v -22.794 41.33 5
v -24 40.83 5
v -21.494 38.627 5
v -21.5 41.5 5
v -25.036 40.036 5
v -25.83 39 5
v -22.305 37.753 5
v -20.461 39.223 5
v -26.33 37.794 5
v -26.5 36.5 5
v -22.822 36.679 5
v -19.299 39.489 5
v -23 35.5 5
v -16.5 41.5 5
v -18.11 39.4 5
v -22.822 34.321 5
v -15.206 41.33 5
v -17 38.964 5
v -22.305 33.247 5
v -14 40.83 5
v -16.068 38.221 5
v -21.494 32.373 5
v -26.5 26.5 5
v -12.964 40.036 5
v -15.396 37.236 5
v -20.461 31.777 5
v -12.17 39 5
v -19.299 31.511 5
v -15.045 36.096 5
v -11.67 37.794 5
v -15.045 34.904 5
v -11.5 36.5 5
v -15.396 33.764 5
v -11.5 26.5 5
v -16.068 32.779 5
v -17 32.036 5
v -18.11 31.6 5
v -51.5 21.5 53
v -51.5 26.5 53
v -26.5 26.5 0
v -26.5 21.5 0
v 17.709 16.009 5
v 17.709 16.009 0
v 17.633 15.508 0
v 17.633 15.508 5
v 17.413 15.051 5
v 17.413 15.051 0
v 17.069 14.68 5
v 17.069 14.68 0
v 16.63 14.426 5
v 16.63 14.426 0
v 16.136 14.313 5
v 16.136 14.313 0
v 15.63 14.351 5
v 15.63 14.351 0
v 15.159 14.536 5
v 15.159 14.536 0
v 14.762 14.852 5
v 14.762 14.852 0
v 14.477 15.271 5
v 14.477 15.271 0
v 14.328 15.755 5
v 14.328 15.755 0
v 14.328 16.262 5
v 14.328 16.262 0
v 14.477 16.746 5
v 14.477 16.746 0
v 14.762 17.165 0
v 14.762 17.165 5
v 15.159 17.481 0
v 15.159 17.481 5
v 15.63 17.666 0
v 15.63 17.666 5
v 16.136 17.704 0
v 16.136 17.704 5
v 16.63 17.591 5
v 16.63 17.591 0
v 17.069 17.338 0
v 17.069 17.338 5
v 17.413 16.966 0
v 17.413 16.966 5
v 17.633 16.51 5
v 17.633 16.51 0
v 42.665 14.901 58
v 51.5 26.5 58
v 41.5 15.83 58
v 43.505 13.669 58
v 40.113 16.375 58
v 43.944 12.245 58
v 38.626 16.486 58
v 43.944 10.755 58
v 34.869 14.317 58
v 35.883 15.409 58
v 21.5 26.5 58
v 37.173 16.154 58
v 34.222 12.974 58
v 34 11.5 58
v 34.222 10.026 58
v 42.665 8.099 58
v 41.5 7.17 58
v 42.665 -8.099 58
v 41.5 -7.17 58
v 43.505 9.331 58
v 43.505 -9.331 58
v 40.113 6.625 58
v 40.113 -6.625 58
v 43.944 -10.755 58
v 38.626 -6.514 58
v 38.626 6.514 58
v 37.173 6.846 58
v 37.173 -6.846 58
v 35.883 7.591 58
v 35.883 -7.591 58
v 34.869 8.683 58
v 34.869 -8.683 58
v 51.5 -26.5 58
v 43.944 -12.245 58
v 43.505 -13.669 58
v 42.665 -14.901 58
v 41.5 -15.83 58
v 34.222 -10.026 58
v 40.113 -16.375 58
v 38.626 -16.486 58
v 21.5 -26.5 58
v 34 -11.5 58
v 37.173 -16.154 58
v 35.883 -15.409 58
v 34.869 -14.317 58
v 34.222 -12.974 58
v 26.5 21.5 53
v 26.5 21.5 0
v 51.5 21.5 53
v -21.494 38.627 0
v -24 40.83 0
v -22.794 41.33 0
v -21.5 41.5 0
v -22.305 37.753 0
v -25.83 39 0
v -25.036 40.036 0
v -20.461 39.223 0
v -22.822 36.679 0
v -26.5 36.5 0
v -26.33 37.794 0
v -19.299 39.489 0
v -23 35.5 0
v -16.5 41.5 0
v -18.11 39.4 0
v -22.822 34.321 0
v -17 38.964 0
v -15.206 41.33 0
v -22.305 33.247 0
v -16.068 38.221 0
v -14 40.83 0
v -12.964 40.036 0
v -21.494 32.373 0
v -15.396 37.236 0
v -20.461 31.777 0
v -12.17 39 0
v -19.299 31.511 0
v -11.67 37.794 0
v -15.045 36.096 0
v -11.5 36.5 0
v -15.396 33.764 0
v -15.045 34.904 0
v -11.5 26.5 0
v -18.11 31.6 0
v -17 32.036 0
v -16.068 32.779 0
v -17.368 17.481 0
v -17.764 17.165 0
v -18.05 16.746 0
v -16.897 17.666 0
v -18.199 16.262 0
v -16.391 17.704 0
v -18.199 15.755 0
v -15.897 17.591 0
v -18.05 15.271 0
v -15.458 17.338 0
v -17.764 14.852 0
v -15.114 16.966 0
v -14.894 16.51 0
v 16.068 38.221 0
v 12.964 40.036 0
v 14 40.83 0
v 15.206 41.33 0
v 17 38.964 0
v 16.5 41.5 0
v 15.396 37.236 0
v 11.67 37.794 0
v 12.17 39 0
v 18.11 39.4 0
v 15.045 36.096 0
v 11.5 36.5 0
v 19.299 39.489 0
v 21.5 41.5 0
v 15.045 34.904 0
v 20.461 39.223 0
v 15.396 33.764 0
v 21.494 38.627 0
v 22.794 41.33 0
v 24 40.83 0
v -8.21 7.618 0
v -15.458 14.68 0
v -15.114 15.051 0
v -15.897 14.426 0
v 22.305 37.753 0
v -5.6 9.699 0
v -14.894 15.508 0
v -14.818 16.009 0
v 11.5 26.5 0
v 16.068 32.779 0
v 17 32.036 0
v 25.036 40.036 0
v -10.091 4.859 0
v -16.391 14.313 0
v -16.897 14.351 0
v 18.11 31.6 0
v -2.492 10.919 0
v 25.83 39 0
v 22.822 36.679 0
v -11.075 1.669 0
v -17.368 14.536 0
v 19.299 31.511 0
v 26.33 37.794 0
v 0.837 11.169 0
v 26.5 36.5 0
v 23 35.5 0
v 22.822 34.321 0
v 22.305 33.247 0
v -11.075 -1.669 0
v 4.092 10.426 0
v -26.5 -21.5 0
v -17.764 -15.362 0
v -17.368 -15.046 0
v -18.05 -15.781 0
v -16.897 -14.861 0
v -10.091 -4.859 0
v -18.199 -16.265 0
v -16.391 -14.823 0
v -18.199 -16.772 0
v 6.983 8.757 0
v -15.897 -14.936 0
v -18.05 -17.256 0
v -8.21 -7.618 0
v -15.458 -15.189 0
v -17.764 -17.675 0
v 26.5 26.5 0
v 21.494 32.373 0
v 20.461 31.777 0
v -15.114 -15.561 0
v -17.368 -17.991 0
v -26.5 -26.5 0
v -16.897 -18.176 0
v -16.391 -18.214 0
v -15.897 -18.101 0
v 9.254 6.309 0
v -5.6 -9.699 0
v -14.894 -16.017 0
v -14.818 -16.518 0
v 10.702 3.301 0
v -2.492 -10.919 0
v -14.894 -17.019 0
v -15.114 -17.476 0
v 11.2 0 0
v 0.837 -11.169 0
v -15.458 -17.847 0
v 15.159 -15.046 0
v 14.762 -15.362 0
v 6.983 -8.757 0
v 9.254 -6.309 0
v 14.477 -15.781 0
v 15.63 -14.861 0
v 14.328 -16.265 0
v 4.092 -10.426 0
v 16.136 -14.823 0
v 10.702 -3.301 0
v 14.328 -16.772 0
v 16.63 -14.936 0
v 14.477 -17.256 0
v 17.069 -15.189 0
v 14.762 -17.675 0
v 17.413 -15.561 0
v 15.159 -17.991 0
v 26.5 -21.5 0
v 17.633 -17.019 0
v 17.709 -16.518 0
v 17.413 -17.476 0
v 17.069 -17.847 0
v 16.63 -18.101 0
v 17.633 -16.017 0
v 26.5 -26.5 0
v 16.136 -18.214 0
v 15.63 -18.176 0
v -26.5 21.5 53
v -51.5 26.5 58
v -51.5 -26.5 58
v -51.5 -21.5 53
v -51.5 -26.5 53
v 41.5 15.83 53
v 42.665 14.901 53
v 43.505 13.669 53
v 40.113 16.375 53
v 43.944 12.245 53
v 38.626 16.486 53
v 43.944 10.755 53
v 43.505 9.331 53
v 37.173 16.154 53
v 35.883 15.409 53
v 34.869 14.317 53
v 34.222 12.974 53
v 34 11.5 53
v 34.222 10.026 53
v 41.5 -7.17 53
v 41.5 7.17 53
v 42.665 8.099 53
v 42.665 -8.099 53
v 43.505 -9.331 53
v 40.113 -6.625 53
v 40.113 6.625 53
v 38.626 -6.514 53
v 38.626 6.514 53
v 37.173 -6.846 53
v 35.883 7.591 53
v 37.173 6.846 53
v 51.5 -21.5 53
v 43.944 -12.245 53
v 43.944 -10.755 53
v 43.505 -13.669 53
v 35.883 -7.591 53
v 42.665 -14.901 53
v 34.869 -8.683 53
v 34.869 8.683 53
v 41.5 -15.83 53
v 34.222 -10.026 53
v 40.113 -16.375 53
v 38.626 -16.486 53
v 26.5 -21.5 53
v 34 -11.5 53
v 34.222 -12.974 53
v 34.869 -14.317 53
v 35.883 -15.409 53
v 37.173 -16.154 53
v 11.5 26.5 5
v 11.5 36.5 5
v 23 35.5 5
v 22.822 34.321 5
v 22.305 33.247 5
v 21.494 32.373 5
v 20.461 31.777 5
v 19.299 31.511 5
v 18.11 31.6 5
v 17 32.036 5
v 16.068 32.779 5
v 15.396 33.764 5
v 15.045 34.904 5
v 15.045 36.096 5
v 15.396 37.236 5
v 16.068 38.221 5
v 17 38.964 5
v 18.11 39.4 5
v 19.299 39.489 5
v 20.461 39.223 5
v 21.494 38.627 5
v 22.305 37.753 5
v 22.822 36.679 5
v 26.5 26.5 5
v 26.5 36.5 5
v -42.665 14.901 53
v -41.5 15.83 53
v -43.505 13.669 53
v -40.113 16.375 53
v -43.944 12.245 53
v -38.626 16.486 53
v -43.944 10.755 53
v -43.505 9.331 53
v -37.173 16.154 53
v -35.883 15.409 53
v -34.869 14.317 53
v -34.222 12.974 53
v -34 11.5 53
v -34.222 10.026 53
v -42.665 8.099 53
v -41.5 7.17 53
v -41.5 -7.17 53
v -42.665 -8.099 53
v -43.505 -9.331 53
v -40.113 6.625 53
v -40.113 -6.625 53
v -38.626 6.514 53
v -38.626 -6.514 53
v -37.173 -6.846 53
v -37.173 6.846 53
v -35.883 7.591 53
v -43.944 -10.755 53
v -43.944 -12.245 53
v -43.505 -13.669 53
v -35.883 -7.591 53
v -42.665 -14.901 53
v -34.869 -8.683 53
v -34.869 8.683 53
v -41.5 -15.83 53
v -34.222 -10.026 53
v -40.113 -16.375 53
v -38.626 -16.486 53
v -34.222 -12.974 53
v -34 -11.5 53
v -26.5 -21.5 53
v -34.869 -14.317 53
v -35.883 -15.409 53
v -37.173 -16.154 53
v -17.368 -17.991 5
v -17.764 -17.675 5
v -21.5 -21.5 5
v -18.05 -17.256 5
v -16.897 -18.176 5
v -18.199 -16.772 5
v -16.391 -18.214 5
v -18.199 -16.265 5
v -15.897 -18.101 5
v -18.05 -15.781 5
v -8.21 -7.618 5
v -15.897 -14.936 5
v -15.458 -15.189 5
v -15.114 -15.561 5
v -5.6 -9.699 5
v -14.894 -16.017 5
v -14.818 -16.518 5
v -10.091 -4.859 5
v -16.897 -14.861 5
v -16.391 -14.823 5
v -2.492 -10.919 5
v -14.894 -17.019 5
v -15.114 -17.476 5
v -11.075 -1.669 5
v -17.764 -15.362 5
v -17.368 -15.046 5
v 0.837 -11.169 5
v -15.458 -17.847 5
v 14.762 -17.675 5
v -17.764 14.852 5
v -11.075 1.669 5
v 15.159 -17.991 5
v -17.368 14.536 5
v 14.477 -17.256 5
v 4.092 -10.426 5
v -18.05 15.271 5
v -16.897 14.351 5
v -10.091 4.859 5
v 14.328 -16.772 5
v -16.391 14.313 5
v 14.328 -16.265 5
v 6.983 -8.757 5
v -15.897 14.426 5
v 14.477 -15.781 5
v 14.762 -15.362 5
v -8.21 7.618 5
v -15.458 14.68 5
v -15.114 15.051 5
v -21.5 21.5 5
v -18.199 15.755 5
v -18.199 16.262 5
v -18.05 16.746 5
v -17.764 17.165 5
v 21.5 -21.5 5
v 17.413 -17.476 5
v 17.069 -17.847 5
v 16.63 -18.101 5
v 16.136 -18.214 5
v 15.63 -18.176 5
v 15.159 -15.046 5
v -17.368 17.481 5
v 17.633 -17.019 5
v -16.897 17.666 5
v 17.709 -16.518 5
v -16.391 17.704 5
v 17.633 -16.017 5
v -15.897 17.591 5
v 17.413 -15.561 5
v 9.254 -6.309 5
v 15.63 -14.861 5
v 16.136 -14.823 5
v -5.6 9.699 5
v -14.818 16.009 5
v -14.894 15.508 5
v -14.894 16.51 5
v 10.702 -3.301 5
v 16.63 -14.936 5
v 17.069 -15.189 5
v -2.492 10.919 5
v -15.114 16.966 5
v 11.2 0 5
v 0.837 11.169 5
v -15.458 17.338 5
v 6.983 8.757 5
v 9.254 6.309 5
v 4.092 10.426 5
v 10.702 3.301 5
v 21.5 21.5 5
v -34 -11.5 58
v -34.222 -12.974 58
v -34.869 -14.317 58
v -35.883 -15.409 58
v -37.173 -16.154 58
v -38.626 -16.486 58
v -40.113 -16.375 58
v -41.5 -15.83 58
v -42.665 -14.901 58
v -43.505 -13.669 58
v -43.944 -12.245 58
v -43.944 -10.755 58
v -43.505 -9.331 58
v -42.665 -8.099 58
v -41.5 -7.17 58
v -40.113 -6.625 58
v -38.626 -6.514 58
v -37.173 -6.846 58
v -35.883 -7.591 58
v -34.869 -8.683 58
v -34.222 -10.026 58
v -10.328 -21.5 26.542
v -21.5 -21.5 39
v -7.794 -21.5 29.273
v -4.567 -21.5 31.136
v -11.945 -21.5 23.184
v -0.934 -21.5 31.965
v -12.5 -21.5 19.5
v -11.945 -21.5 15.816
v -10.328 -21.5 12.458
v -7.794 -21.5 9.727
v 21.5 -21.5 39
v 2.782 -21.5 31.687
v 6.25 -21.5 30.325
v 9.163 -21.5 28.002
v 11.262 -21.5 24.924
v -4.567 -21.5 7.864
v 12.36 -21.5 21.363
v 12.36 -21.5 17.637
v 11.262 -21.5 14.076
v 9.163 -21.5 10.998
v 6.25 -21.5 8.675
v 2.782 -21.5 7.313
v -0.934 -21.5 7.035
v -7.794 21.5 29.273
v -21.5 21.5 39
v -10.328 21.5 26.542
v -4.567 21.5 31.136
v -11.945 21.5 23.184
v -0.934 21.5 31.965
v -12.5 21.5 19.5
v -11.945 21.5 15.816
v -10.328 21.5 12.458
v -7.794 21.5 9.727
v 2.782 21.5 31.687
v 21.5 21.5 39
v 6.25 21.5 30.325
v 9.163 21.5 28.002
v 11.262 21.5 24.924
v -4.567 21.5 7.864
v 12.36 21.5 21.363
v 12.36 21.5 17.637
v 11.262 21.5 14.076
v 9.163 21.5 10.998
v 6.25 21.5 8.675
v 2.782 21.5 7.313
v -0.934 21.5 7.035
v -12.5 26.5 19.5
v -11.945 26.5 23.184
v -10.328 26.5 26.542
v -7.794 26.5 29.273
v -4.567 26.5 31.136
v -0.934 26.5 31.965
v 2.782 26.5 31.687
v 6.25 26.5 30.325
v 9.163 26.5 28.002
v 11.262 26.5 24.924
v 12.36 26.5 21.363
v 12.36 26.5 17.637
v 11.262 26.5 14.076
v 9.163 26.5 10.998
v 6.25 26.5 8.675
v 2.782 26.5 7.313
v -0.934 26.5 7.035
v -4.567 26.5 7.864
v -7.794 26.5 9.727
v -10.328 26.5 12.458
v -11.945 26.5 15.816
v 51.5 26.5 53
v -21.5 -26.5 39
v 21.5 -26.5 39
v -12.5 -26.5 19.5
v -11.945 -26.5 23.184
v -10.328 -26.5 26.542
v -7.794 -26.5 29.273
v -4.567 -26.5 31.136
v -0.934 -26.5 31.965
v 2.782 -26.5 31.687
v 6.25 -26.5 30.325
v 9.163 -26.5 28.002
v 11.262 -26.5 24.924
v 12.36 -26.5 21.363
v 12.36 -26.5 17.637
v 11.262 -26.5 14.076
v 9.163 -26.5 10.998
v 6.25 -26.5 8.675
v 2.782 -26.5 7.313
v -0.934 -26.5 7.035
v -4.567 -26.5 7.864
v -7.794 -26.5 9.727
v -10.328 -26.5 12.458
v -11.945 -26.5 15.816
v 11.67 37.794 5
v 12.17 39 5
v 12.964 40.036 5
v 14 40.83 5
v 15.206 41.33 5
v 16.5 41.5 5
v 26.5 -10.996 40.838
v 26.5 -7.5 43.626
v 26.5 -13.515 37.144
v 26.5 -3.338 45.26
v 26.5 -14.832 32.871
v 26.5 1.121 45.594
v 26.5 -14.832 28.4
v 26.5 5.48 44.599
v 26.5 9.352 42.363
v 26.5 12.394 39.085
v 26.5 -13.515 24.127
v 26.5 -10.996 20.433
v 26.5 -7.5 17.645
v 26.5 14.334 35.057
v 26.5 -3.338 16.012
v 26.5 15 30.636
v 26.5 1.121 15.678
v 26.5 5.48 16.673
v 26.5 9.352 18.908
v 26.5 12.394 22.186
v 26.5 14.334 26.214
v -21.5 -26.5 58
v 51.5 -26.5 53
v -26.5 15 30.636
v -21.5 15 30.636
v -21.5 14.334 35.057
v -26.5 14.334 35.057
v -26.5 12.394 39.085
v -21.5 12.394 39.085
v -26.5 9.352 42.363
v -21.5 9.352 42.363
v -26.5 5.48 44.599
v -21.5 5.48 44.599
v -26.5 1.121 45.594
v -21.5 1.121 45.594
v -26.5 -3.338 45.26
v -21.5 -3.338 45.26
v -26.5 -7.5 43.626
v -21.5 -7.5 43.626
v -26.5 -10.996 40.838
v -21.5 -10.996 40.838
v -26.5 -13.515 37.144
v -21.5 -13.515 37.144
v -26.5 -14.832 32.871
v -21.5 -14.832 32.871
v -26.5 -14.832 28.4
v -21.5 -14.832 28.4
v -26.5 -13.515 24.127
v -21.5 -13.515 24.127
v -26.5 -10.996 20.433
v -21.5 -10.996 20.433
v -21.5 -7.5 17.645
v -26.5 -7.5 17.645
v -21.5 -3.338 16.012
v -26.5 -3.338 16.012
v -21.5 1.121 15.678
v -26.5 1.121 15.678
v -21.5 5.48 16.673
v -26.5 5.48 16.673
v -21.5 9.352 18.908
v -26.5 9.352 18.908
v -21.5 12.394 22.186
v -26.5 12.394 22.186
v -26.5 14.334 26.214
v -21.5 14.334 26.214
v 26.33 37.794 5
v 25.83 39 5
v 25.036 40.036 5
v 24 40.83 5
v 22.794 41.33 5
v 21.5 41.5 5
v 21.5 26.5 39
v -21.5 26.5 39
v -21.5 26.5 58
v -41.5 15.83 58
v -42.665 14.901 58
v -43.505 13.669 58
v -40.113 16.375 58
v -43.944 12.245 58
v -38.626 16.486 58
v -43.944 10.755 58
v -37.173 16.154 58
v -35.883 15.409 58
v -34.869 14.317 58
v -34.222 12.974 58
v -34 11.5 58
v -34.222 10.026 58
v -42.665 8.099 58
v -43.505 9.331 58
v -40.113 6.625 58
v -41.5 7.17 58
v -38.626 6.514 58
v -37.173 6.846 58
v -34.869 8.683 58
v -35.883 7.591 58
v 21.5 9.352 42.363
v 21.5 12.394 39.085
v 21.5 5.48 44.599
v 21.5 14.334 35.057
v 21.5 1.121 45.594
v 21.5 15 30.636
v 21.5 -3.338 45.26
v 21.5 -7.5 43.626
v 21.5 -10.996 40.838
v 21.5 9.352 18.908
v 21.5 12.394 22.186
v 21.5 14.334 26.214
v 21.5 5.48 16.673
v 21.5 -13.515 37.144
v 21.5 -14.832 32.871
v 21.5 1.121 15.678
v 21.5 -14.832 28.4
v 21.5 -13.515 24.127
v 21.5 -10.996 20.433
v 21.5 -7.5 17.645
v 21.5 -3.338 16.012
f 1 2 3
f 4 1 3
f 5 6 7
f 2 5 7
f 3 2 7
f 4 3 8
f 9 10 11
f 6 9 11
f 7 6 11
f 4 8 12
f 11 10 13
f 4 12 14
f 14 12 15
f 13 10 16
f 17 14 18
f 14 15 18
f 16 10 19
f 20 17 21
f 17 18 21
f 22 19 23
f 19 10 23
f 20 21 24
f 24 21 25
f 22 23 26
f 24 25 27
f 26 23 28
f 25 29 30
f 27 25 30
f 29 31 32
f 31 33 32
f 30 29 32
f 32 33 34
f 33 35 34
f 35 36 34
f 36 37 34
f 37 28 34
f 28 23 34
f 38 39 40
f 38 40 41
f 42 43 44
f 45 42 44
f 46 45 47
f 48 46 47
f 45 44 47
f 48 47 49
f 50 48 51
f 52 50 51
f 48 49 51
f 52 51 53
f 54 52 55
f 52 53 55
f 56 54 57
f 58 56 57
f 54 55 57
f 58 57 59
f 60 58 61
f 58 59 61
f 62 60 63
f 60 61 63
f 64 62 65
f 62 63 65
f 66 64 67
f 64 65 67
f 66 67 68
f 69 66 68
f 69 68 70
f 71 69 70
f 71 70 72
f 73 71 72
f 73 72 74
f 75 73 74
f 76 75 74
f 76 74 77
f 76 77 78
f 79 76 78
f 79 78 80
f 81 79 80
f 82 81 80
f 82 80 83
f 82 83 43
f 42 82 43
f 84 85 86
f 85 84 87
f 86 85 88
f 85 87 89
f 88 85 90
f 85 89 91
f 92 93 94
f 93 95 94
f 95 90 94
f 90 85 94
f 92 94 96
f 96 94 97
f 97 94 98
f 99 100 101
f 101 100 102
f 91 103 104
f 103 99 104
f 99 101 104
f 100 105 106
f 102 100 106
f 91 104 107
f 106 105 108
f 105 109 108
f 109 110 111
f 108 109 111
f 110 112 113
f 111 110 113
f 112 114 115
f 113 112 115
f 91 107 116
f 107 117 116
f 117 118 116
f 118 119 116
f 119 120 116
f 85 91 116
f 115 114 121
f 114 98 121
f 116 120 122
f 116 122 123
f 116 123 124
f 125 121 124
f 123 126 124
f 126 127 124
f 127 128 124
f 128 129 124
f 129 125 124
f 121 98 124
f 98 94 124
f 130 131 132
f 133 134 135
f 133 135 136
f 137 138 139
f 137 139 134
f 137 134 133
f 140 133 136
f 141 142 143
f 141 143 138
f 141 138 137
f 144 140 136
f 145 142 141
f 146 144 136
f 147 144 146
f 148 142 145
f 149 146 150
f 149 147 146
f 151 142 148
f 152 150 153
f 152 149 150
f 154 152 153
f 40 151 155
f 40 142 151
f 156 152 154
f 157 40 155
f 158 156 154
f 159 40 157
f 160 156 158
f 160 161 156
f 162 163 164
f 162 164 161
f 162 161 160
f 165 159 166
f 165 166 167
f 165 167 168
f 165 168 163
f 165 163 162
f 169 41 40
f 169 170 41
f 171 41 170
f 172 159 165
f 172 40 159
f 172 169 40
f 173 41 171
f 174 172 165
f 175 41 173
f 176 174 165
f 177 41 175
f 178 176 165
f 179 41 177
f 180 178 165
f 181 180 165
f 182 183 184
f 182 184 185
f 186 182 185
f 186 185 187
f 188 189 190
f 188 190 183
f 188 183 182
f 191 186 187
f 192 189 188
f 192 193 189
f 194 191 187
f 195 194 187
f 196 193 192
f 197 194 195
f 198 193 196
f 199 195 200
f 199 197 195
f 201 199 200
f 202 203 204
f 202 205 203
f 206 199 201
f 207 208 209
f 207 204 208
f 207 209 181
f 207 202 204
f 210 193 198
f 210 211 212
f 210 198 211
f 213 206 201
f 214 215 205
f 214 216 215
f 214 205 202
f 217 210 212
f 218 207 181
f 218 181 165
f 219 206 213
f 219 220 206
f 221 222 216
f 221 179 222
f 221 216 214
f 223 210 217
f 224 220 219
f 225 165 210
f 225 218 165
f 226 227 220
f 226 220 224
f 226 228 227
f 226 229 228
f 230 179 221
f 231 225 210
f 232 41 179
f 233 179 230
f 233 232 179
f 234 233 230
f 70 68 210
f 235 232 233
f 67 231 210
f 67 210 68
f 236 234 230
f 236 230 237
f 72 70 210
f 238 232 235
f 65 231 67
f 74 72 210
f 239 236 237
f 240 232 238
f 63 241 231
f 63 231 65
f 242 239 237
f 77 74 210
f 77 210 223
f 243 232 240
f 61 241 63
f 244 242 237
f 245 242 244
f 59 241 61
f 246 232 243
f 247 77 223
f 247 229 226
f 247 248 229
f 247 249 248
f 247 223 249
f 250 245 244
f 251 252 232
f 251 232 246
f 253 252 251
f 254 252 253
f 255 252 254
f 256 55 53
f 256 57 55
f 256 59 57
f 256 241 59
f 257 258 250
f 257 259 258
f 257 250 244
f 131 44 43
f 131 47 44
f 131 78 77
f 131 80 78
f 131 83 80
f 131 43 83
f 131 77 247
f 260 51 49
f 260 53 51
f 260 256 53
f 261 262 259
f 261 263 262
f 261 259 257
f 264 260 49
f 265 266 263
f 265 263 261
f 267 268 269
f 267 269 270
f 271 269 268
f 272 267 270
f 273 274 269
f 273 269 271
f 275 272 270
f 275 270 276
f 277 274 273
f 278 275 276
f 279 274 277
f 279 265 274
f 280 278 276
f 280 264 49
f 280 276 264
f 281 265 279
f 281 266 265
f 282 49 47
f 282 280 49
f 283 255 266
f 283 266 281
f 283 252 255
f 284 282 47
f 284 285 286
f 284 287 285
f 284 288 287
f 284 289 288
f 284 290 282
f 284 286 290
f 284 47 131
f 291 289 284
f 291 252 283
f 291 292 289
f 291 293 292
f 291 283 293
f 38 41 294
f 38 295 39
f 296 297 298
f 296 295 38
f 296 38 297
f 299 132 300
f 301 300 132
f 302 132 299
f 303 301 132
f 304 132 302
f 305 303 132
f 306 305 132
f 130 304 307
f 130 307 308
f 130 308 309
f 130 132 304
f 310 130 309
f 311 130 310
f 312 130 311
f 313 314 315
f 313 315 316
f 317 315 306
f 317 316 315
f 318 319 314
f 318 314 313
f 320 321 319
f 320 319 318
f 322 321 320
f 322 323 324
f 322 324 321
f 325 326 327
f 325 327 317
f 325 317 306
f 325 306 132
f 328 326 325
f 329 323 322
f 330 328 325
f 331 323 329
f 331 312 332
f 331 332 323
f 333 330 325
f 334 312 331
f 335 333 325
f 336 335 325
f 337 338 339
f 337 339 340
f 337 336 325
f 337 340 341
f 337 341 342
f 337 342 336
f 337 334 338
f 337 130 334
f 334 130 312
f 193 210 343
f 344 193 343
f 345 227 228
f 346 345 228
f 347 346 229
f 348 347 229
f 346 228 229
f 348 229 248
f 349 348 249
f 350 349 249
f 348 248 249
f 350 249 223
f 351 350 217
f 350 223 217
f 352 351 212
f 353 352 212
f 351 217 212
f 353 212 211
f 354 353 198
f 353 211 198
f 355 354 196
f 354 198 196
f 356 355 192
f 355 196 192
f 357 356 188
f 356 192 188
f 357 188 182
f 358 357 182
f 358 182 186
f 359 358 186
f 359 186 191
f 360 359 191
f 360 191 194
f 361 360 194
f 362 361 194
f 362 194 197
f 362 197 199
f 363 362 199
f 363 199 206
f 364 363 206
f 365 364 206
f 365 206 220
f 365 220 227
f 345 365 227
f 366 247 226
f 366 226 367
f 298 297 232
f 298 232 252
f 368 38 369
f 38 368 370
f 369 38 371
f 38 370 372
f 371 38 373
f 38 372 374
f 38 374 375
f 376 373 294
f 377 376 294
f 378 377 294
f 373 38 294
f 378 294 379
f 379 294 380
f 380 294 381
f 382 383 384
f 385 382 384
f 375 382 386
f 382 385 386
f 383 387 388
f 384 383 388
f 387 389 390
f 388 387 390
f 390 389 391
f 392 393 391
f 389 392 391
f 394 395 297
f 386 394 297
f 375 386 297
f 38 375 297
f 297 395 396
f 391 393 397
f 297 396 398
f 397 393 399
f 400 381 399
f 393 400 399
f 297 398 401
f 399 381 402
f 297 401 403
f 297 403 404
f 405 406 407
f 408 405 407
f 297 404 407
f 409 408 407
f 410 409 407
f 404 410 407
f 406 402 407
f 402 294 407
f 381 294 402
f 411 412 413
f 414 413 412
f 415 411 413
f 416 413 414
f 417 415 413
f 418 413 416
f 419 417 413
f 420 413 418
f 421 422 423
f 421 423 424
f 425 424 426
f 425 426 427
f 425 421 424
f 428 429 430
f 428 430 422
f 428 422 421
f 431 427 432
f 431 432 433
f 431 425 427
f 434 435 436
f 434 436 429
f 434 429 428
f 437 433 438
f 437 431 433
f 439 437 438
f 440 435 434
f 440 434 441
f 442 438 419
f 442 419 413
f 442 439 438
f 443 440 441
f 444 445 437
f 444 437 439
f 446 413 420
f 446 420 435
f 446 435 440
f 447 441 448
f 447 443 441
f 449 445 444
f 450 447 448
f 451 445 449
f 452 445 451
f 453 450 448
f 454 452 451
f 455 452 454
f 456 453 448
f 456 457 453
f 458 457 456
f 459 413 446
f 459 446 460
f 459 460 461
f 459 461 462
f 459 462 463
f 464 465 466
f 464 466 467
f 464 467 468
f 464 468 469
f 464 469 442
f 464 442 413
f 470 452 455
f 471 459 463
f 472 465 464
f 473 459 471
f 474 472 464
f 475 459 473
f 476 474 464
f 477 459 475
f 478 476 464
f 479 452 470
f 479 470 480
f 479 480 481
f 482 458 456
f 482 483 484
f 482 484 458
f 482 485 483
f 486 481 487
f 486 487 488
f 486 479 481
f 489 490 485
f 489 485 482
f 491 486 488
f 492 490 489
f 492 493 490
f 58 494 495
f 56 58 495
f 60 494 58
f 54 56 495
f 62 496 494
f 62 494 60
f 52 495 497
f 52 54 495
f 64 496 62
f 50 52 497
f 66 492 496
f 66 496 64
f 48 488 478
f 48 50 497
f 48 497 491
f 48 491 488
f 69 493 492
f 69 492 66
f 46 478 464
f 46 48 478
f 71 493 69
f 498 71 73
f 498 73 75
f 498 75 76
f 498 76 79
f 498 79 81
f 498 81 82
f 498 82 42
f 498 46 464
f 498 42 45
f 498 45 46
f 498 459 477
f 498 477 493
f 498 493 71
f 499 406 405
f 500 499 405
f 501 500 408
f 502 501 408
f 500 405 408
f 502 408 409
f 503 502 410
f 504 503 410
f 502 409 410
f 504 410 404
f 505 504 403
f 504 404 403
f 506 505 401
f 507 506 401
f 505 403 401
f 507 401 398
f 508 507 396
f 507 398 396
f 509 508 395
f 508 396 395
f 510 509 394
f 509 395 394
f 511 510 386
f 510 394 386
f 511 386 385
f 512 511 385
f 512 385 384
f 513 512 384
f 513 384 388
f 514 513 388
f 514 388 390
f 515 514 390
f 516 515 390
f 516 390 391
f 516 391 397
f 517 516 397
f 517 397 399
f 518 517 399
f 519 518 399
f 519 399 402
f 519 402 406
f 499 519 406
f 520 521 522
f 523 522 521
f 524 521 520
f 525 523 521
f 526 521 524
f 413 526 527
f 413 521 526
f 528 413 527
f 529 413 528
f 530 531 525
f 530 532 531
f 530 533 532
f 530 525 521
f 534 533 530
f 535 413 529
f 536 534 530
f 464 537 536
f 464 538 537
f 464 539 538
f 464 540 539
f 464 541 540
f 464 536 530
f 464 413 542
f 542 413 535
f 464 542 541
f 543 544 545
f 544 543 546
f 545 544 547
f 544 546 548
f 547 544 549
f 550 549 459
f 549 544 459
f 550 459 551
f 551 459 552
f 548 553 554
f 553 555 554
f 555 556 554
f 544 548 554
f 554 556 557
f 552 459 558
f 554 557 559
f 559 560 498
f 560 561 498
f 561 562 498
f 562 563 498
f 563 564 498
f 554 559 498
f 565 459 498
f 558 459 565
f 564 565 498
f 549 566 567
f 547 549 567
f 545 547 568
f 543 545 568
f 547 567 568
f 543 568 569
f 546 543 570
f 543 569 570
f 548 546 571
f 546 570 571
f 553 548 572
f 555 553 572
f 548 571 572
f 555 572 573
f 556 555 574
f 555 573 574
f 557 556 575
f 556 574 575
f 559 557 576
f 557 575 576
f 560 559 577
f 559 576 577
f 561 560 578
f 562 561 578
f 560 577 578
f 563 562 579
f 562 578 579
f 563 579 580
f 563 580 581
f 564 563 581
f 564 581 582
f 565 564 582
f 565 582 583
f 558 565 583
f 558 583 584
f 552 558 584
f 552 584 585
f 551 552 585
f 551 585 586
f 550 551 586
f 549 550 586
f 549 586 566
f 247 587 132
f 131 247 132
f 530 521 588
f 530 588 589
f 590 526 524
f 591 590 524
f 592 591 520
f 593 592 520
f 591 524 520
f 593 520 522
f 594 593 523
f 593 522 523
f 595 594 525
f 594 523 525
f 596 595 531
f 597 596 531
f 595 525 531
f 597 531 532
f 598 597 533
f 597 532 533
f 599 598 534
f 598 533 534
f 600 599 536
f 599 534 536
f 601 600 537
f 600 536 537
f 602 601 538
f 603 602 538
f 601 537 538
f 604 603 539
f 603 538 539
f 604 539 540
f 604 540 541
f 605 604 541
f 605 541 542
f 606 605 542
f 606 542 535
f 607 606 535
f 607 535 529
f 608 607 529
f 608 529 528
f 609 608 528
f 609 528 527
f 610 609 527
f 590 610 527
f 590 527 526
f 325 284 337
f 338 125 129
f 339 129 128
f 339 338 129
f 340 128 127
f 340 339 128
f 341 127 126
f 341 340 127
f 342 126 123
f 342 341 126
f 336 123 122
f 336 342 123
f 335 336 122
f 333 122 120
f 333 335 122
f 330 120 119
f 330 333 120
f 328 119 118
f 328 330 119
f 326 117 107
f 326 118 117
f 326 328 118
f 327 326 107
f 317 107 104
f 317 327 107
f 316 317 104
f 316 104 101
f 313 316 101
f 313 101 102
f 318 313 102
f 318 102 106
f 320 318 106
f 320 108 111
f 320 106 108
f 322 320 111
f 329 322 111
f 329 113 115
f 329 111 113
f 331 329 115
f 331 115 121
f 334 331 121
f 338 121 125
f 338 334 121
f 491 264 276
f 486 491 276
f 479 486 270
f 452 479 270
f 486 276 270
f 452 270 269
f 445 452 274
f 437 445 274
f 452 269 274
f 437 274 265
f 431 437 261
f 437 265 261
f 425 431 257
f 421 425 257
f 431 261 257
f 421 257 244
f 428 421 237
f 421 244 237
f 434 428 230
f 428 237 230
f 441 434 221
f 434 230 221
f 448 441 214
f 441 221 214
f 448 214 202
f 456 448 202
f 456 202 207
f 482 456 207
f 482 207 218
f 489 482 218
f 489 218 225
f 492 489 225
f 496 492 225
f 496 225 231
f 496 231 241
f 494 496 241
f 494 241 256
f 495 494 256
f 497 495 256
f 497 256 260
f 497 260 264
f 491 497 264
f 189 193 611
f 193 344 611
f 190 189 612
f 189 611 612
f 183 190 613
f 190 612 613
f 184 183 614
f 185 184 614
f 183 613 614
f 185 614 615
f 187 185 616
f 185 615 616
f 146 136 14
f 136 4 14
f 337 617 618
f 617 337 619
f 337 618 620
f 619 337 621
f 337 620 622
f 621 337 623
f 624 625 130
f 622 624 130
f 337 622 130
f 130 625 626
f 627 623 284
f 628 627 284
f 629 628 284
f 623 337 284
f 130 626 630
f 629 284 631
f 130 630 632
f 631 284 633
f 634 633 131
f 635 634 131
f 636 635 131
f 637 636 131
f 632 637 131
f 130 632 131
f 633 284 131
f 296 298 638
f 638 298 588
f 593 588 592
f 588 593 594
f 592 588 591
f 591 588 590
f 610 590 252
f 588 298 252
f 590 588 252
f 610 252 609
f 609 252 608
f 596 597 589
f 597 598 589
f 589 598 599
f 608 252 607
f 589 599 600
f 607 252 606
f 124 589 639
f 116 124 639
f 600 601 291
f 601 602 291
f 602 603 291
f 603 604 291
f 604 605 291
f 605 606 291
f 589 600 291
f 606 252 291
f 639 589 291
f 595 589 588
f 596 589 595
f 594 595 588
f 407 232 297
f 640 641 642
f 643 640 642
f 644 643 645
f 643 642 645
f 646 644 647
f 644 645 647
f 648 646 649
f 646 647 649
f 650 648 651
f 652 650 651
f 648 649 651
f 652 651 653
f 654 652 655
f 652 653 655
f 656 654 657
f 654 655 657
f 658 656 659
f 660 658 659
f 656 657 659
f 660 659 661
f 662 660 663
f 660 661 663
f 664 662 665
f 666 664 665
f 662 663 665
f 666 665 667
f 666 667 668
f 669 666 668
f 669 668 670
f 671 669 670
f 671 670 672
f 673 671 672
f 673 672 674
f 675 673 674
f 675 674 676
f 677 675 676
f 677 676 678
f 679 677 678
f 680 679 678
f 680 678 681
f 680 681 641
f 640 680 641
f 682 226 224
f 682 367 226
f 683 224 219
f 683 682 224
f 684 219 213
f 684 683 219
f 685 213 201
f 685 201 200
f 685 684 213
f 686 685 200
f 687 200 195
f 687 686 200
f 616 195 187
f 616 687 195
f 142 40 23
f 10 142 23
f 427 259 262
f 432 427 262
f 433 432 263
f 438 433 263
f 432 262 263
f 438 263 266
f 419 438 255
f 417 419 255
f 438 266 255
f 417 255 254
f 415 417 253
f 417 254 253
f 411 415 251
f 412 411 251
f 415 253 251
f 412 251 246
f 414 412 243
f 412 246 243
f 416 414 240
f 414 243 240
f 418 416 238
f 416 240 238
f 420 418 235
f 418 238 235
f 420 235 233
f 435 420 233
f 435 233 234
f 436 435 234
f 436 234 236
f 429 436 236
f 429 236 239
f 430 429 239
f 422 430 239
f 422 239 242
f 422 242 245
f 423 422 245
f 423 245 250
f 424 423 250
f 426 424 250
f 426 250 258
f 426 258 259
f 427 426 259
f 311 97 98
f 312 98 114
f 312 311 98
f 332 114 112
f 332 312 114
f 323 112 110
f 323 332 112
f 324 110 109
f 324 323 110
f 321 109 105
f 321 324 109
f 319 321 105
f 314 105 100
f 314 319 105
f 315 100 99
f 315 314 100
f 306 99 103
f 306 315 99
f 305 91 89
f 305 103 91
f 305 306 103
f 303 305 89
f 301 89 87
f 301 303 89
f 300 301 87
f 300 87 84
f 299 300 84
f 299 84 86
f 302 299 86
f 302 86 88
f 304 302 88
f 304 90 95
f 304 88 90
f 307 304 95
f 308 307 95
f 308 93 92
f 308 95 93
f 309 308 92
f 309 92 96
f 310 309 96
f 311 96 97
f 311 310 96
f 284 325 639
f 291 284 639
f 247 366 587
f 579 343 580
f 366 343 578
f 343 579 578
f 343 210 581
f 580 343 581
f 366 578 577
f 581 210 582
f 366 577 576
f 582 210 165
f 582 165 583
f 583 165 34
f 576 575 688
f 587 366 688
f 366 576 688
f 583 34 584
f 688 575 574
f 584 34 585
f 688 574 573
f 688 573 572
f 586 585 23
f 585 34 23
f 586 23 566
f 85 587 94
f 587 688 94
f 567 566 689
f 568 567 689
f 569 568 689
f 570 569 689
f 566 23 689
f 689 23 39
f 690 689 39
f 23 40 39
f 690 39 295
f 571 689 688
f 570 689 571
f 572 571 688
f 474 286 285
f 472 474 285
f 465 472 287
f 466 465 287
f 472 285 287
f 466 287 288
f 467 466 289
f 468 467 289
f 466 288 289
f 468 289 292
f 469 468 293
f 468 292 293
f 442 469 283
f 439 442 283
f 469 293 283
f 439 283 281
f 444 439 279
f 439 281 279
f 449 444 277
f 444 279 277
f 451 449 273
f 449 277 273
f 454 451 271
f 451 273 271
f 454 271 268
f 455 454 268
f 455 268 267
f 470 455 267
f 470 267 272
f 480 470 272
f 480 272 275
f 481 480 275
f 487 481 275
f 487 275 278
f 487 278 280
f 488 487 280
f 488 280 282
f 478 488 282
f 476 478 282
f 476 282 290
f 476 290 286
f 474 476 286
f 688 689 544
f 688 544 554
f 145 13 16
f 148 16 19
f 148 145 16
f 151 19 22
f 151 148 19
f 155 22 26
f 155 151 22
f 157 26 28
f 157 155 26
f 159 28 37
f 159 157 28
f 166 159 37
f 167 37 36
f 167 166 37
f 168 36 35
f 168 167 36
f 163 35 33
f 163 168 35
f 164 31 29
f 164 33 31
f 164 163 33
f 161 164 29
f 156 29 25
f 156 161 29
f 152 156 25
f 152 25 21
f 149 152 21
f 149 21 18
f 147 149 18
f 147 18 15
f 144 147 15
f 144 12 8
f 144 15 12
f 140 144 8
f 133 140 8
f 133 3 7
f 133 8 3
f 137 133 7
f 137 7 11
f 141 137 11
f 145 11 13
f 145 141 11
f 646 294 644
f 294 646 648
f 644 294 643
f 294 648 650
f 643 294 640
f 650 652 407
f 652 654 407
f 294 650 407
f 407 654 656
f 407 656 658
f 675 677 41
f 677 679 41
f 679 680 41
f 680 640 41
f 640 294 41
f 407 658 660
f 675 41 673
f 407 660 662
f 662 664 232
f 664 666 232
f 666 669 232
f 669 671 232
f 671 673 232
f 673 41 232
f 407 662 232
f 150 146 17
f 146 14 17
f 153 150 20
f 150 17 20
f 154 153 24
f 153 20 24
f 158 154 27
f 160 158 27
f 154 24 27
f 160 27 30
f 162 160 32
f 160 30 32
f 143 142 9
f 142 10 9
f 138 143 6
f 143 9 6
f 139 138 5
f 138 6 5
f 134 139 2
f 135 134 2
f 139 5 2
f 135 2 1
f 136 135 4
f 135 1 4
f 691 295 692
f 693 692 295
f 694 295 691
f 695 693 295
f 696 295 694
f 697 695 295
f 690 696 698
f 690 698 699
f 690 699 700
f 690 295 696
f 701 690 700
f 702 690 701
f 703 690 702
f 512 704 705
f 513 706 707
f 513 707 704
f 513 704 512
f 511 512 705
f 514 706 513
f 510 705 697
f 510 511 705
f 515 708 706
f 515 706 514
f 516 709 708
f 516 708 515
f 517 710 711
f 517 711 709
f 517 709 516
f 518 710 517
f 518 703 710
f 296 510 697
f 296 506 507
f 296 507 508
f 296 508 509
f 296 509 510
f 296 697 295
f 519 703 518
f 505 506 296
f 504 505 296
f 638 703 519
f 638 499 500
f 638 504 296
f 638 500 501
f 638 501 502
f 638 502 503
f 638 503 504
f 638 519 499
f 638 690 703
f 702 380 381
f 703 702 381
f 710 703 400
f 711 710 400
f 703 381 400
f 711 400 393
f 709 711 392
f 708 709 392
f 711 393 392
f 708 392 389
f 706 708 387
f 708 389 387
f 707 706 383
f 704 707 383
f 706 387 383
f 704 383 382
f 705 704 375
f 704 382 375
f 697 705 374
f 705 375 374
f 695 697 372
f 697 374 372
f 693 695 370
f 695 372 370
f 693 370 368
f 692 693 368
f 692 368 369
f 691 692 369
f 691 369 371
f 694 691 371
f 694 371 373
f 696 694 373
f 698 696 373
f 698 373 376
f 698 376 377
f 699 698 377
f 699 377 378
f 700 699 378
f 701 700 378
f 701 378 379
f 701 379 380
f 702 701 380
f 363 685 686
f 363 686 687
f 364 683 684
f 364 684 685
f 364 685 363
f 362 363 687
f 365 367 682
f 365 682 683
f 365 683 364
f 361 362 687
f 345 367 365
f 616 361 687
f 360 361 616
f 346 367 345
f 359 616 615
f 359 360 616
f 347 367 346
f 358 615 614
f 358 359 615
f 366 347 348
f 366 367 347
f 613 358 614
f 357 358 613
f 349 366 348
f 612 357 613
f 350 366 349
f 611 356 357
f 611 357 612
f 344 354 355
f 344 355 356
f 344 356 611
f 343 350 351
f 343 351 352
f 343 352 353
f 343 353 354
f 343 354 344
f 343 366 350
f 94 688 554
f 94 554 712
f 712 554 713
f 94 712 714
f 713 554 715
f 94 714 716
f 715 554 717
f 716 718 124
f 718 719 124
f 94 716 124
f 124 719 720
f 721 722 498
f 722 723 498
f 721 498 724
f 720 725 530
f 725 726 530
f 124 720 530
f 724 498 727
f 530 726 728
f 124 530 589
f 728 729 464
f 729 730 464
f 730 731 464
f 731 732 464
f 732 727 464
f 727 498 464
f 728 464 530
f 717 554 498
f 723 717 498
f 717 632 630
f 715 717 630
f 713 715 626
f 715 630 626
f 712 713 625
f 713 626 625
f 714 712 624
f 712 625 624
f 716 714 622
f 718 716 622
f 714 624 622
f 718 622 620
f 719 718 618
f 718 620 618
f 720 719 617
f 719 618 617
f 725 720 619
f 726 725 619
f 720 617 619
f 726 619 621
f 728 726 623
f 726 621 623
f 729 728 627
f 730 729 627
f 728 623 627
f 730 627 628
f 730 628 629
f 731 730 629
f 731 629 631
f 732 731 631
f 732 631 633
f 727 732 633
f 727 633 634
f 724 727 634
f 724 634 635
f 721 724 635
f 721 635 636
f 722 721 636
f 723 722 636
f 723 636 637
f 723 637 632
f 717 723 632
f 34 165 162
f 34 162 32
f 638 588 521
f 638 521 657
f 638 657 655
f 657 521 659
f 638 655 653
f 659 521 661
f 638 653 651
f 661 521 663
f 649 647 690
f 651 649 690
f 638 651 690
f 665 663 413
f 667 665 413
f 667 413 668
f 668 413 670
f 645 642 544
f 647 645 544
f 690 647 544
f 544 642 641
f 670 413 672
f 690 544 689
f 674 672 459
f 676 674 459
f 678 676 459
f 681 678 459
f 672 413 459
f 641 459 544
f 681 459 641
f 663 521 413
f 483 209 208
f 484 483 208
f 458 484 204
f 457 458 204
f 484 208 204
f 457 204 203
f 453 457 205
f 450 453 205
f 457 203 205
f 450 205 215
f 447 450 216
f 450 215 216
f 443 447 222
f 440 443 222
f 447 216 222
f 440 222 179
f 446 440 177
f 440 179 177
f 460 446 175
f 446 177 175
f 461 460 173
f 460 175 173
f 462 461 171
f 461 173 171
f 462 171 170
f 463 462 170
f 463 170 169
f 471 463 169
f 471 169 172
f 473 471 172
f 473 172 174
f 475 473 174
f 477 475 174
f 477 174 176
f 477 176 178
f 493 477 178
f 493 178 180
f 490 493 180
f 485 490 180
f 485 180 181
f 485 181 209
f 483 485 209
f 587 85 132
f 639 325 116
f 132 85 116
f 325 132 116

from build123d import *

# Parameters (mm, degrees)
F0_W      = 53
F0_H      = 53
F1_DEPTH  = 10
F2_W      = 43
F2_H      = 43
F3_DEPTH  = 5
F4_R      = 1.7
F5_DEPTH  = 25
F6_R      = 11.2
F7_DEPTH  = 25
F9_DEPTH  = 48
F10_DEPTH = 29
F11_R     = 15
F12_DEPTH = 53.001
F13_R     = 12.5
F14_DEPTH = 53.001
F15_W     = 5
F15_H     = 58
F16_DEPTH = 25
F17_SIZE2 = 53
F17_SIZE  = 25
F18_W     = 43
F18_H     = 5
F19_DEPTH = 25
F20_R     = 5
F21_DEPTH = 25
F22_W     = 15
F22_H     = 5
F23_DEPTH = 15
F24_R     = 5
F25_R     = 4
F26_DEPTH = 25


# Not quite as in the source:
# - a pattern or mirror of a feature is missing from the dataset's text; its kind, count and spacing are read off the source's solid


with BuildPart() as f1:
    # F0 (on Top) → F1 (new body)
    with BuildSketch(Plane.XY):
        Rectangle(F0_W, F0_H)
    extrude(amount=F1_DEPTH)

    # F2 (on face) → F3 (cut)
    with BuildSketch(Plane.XY.offset(10)):
        Rectangle(F2_W, F2_H)
    extrude(amount=-F3_DEPTH, mode=Mode.SUBTRACT)

    # F4 (on face) → F5 (cut)
    with BuildSketch(Plane(origin=(0, 0, 0), x_dir=(1, 0, 0), z_dir=(0, 0, -1))):
        with Locations((-16.5182938799, 16.5182938799)):
            Circle(F4_R)
        with Locations((16.0086180547, 16.5182938799)):
            Circle(F4_R)
        with Locations((16.0086180547, -16.0086180547)):
            Circle(F4_R)
        with Locations((-16.5182938799, -16.0086180547)):
            Circle(F4_R)
    extrude(amount=-F5_DEPTH, mode=Mode.SUBTRACT)

    # F6 (on face) → F7 (cut)
    with BuildSketch(Plane(origin=(0, 0, 0), x_dir=(1, 0, 0), z_dir=(0, 0, -1))):
        Circle(F6_R)
    extrude(amount=-F7_DEPTH, mode=Mode.SUBTRACT)

    # F8 (on face) → F9 (join)
    with BuildSketch(Plane.XY.offset(10)):
        Polygon((-21.5, -21.5), (-21.5, 21.5), (-21.5, 26.5), (-26.5, 26.5), (-26.5, -26.5), (-21.5, -26.5), align=None)
        Polygon((21.5, 26.5), (21.5, 21.5), (21.5, -21.5), (21.5, -26.5), (26.5, -26.5), (26.5, 26.5), align=None)
    extrude(amount=F9_DEPTH)

    # F10 (add): faces of the model
    f10_faces = [f1.faces().sort_by_distance(p)[0] for p in [
        (0, 24, 10),
        (0, -24, 10),
    ]]
    extrude(f10_faces, amount=F10_DEPTH)

    # F11 (on face) → F12 (cut, through all)
    with BuildSketch(Plane.YZ.offset(26.5)):
        with Locations((0, 30.6356716901)):
            Circle(F11_R)
    extrude(amount=-F12_DEPTH, mode=Mode.SUBTRACT)

    # F13 (on face) → F14 (cut, through all)
    with BuildSketch(Plane(origin=(0, 26.5, 0), x_dir=(-1, 0, 0), z_dir=(0, 1, 0))):
        with Locations((0, 19.5)):
            Circle(F13_R)
    extrude(amount=-F14_DEPTH, mode=Mode.SUBTRACT)

    # F15 (on face) → F16 (join)
    with BuildSketch(Plane(origin=(-26.5, 0, 0), x_dir=(0, -1, 0), z_dir=(-1, 0, 0))):
        with Locations((-24, 29)):
            Rectangle(F15_W, F15_H)
        with Locations((24, 29)):
            Rectangle(F15_W, F15_H)
    f16 = extrude(amount=F16_DEPTH)

    # F16_copies: F16 across plane
    add(f16.mirror(Plane(origin=(0, 0, 0), x_dir=(0, 0, 1), z_dir=(1, 0, 0))))

    # F17
    f17_edges = [f1.edges().sort_by_distance(p)[0] for p in [
        (-51.5, 24, 0),
        (-51.5, -24, 0),
        (51.5, 24, 0),
        (51.5, -24, 0),
    ]]
    f17_side = f1.faces().sort_by_distance((25.341639, 0, 0))[0]
    chamfer(f17_edges, length=F17_SIZE, length2=F17_SIZE2, reference=f17_side)

    # F18 (on face) → F19 (join)
    with BuildSketch(Plane(origin=(-26.5, 0, 0), x_dir=(0, -1, 0), z_dir=(-1, 0, 0))):
        with Locations((0, 55.5)):
            Rectangle(F18_W, F18_H)
    f19 = extrude(amount=F19_DEPTH)

    # F19_copies: F19 across plane
    add(f19.mirror(Plane(origin=(0, 0, 0), x_dir=(0, 0, 1), z_dir=(1, 0, 0))))

    # F20 (on face) → F21 (cut)
    with BuildSketch(Plane(origin=(0, 0, 53), x_dir=(1, 0, 0), z_dir=(0, 0, -1))):
        with Locations((-39, 11.5)):
            Circle(F20_R)
        with Locations((-39, -11.5)):
            Circle(F20_R)
    f21 = extrude(amount=-F21_DEPTH, mode=Mode.SUBTRACT)

    # F21_copies: F21 across plane
    add(f21.mirror(Plane(origin=(0, 0, 0), x_dir=(0, 0, 1), z_dir=(1, 0, 0))), mode=Mode.SUBTRACT)

    # F22 (on face) → F23 (join)
    with BuildSketch(Plane(origin=(0, 26.5, 0), x_dir=(-1, 0, 0), z_dir=(0, 1, 0))):
        with Locations((-19, 2.5)):
            Rectangle(F22_W, F22_H)
    f23 = extrude(amount=F23_DEPTH)

    # F23_copies: F23 across plane
    add(f23.mirror(Plane(origin=(0, 0, 0), x_dir=(0, 0, -1), z_dir=(-1, 0, 0))))

    # F24
    f24_edges = [f1.edges().sort_by_distance(p)[0] for p in [
        (11.5, 41.5, 2.5),
        (26.5, 41.5, 2.5),
        (-11.5, 41.5, 2.5),
        (-26.5, 41.5, 2.5),
    ]]
    fillet(f24_edges, radius=F24_R)

    # F25 (on face) → F26 (cut)
    with BuildSketch(Plane(origin=(0, 0, 0), x_dir=(1, 0, 0), z_dir=(0, 0, -1))):
        with Locations((19, -35.5)):
            Circle(F25_R)
    f26 = extrude(amount=-F26_DEPTH, mode=Mode.SUBTRACT)

    # F26_copies: F26 across plane
    add(f26.mirror(Plane(origin=(0, 0, 0), x_dir=(0, 0, -1), z_dir=(-1, 0, 0))), mode=Mode.SUBTRACT)


solid = f1.part
